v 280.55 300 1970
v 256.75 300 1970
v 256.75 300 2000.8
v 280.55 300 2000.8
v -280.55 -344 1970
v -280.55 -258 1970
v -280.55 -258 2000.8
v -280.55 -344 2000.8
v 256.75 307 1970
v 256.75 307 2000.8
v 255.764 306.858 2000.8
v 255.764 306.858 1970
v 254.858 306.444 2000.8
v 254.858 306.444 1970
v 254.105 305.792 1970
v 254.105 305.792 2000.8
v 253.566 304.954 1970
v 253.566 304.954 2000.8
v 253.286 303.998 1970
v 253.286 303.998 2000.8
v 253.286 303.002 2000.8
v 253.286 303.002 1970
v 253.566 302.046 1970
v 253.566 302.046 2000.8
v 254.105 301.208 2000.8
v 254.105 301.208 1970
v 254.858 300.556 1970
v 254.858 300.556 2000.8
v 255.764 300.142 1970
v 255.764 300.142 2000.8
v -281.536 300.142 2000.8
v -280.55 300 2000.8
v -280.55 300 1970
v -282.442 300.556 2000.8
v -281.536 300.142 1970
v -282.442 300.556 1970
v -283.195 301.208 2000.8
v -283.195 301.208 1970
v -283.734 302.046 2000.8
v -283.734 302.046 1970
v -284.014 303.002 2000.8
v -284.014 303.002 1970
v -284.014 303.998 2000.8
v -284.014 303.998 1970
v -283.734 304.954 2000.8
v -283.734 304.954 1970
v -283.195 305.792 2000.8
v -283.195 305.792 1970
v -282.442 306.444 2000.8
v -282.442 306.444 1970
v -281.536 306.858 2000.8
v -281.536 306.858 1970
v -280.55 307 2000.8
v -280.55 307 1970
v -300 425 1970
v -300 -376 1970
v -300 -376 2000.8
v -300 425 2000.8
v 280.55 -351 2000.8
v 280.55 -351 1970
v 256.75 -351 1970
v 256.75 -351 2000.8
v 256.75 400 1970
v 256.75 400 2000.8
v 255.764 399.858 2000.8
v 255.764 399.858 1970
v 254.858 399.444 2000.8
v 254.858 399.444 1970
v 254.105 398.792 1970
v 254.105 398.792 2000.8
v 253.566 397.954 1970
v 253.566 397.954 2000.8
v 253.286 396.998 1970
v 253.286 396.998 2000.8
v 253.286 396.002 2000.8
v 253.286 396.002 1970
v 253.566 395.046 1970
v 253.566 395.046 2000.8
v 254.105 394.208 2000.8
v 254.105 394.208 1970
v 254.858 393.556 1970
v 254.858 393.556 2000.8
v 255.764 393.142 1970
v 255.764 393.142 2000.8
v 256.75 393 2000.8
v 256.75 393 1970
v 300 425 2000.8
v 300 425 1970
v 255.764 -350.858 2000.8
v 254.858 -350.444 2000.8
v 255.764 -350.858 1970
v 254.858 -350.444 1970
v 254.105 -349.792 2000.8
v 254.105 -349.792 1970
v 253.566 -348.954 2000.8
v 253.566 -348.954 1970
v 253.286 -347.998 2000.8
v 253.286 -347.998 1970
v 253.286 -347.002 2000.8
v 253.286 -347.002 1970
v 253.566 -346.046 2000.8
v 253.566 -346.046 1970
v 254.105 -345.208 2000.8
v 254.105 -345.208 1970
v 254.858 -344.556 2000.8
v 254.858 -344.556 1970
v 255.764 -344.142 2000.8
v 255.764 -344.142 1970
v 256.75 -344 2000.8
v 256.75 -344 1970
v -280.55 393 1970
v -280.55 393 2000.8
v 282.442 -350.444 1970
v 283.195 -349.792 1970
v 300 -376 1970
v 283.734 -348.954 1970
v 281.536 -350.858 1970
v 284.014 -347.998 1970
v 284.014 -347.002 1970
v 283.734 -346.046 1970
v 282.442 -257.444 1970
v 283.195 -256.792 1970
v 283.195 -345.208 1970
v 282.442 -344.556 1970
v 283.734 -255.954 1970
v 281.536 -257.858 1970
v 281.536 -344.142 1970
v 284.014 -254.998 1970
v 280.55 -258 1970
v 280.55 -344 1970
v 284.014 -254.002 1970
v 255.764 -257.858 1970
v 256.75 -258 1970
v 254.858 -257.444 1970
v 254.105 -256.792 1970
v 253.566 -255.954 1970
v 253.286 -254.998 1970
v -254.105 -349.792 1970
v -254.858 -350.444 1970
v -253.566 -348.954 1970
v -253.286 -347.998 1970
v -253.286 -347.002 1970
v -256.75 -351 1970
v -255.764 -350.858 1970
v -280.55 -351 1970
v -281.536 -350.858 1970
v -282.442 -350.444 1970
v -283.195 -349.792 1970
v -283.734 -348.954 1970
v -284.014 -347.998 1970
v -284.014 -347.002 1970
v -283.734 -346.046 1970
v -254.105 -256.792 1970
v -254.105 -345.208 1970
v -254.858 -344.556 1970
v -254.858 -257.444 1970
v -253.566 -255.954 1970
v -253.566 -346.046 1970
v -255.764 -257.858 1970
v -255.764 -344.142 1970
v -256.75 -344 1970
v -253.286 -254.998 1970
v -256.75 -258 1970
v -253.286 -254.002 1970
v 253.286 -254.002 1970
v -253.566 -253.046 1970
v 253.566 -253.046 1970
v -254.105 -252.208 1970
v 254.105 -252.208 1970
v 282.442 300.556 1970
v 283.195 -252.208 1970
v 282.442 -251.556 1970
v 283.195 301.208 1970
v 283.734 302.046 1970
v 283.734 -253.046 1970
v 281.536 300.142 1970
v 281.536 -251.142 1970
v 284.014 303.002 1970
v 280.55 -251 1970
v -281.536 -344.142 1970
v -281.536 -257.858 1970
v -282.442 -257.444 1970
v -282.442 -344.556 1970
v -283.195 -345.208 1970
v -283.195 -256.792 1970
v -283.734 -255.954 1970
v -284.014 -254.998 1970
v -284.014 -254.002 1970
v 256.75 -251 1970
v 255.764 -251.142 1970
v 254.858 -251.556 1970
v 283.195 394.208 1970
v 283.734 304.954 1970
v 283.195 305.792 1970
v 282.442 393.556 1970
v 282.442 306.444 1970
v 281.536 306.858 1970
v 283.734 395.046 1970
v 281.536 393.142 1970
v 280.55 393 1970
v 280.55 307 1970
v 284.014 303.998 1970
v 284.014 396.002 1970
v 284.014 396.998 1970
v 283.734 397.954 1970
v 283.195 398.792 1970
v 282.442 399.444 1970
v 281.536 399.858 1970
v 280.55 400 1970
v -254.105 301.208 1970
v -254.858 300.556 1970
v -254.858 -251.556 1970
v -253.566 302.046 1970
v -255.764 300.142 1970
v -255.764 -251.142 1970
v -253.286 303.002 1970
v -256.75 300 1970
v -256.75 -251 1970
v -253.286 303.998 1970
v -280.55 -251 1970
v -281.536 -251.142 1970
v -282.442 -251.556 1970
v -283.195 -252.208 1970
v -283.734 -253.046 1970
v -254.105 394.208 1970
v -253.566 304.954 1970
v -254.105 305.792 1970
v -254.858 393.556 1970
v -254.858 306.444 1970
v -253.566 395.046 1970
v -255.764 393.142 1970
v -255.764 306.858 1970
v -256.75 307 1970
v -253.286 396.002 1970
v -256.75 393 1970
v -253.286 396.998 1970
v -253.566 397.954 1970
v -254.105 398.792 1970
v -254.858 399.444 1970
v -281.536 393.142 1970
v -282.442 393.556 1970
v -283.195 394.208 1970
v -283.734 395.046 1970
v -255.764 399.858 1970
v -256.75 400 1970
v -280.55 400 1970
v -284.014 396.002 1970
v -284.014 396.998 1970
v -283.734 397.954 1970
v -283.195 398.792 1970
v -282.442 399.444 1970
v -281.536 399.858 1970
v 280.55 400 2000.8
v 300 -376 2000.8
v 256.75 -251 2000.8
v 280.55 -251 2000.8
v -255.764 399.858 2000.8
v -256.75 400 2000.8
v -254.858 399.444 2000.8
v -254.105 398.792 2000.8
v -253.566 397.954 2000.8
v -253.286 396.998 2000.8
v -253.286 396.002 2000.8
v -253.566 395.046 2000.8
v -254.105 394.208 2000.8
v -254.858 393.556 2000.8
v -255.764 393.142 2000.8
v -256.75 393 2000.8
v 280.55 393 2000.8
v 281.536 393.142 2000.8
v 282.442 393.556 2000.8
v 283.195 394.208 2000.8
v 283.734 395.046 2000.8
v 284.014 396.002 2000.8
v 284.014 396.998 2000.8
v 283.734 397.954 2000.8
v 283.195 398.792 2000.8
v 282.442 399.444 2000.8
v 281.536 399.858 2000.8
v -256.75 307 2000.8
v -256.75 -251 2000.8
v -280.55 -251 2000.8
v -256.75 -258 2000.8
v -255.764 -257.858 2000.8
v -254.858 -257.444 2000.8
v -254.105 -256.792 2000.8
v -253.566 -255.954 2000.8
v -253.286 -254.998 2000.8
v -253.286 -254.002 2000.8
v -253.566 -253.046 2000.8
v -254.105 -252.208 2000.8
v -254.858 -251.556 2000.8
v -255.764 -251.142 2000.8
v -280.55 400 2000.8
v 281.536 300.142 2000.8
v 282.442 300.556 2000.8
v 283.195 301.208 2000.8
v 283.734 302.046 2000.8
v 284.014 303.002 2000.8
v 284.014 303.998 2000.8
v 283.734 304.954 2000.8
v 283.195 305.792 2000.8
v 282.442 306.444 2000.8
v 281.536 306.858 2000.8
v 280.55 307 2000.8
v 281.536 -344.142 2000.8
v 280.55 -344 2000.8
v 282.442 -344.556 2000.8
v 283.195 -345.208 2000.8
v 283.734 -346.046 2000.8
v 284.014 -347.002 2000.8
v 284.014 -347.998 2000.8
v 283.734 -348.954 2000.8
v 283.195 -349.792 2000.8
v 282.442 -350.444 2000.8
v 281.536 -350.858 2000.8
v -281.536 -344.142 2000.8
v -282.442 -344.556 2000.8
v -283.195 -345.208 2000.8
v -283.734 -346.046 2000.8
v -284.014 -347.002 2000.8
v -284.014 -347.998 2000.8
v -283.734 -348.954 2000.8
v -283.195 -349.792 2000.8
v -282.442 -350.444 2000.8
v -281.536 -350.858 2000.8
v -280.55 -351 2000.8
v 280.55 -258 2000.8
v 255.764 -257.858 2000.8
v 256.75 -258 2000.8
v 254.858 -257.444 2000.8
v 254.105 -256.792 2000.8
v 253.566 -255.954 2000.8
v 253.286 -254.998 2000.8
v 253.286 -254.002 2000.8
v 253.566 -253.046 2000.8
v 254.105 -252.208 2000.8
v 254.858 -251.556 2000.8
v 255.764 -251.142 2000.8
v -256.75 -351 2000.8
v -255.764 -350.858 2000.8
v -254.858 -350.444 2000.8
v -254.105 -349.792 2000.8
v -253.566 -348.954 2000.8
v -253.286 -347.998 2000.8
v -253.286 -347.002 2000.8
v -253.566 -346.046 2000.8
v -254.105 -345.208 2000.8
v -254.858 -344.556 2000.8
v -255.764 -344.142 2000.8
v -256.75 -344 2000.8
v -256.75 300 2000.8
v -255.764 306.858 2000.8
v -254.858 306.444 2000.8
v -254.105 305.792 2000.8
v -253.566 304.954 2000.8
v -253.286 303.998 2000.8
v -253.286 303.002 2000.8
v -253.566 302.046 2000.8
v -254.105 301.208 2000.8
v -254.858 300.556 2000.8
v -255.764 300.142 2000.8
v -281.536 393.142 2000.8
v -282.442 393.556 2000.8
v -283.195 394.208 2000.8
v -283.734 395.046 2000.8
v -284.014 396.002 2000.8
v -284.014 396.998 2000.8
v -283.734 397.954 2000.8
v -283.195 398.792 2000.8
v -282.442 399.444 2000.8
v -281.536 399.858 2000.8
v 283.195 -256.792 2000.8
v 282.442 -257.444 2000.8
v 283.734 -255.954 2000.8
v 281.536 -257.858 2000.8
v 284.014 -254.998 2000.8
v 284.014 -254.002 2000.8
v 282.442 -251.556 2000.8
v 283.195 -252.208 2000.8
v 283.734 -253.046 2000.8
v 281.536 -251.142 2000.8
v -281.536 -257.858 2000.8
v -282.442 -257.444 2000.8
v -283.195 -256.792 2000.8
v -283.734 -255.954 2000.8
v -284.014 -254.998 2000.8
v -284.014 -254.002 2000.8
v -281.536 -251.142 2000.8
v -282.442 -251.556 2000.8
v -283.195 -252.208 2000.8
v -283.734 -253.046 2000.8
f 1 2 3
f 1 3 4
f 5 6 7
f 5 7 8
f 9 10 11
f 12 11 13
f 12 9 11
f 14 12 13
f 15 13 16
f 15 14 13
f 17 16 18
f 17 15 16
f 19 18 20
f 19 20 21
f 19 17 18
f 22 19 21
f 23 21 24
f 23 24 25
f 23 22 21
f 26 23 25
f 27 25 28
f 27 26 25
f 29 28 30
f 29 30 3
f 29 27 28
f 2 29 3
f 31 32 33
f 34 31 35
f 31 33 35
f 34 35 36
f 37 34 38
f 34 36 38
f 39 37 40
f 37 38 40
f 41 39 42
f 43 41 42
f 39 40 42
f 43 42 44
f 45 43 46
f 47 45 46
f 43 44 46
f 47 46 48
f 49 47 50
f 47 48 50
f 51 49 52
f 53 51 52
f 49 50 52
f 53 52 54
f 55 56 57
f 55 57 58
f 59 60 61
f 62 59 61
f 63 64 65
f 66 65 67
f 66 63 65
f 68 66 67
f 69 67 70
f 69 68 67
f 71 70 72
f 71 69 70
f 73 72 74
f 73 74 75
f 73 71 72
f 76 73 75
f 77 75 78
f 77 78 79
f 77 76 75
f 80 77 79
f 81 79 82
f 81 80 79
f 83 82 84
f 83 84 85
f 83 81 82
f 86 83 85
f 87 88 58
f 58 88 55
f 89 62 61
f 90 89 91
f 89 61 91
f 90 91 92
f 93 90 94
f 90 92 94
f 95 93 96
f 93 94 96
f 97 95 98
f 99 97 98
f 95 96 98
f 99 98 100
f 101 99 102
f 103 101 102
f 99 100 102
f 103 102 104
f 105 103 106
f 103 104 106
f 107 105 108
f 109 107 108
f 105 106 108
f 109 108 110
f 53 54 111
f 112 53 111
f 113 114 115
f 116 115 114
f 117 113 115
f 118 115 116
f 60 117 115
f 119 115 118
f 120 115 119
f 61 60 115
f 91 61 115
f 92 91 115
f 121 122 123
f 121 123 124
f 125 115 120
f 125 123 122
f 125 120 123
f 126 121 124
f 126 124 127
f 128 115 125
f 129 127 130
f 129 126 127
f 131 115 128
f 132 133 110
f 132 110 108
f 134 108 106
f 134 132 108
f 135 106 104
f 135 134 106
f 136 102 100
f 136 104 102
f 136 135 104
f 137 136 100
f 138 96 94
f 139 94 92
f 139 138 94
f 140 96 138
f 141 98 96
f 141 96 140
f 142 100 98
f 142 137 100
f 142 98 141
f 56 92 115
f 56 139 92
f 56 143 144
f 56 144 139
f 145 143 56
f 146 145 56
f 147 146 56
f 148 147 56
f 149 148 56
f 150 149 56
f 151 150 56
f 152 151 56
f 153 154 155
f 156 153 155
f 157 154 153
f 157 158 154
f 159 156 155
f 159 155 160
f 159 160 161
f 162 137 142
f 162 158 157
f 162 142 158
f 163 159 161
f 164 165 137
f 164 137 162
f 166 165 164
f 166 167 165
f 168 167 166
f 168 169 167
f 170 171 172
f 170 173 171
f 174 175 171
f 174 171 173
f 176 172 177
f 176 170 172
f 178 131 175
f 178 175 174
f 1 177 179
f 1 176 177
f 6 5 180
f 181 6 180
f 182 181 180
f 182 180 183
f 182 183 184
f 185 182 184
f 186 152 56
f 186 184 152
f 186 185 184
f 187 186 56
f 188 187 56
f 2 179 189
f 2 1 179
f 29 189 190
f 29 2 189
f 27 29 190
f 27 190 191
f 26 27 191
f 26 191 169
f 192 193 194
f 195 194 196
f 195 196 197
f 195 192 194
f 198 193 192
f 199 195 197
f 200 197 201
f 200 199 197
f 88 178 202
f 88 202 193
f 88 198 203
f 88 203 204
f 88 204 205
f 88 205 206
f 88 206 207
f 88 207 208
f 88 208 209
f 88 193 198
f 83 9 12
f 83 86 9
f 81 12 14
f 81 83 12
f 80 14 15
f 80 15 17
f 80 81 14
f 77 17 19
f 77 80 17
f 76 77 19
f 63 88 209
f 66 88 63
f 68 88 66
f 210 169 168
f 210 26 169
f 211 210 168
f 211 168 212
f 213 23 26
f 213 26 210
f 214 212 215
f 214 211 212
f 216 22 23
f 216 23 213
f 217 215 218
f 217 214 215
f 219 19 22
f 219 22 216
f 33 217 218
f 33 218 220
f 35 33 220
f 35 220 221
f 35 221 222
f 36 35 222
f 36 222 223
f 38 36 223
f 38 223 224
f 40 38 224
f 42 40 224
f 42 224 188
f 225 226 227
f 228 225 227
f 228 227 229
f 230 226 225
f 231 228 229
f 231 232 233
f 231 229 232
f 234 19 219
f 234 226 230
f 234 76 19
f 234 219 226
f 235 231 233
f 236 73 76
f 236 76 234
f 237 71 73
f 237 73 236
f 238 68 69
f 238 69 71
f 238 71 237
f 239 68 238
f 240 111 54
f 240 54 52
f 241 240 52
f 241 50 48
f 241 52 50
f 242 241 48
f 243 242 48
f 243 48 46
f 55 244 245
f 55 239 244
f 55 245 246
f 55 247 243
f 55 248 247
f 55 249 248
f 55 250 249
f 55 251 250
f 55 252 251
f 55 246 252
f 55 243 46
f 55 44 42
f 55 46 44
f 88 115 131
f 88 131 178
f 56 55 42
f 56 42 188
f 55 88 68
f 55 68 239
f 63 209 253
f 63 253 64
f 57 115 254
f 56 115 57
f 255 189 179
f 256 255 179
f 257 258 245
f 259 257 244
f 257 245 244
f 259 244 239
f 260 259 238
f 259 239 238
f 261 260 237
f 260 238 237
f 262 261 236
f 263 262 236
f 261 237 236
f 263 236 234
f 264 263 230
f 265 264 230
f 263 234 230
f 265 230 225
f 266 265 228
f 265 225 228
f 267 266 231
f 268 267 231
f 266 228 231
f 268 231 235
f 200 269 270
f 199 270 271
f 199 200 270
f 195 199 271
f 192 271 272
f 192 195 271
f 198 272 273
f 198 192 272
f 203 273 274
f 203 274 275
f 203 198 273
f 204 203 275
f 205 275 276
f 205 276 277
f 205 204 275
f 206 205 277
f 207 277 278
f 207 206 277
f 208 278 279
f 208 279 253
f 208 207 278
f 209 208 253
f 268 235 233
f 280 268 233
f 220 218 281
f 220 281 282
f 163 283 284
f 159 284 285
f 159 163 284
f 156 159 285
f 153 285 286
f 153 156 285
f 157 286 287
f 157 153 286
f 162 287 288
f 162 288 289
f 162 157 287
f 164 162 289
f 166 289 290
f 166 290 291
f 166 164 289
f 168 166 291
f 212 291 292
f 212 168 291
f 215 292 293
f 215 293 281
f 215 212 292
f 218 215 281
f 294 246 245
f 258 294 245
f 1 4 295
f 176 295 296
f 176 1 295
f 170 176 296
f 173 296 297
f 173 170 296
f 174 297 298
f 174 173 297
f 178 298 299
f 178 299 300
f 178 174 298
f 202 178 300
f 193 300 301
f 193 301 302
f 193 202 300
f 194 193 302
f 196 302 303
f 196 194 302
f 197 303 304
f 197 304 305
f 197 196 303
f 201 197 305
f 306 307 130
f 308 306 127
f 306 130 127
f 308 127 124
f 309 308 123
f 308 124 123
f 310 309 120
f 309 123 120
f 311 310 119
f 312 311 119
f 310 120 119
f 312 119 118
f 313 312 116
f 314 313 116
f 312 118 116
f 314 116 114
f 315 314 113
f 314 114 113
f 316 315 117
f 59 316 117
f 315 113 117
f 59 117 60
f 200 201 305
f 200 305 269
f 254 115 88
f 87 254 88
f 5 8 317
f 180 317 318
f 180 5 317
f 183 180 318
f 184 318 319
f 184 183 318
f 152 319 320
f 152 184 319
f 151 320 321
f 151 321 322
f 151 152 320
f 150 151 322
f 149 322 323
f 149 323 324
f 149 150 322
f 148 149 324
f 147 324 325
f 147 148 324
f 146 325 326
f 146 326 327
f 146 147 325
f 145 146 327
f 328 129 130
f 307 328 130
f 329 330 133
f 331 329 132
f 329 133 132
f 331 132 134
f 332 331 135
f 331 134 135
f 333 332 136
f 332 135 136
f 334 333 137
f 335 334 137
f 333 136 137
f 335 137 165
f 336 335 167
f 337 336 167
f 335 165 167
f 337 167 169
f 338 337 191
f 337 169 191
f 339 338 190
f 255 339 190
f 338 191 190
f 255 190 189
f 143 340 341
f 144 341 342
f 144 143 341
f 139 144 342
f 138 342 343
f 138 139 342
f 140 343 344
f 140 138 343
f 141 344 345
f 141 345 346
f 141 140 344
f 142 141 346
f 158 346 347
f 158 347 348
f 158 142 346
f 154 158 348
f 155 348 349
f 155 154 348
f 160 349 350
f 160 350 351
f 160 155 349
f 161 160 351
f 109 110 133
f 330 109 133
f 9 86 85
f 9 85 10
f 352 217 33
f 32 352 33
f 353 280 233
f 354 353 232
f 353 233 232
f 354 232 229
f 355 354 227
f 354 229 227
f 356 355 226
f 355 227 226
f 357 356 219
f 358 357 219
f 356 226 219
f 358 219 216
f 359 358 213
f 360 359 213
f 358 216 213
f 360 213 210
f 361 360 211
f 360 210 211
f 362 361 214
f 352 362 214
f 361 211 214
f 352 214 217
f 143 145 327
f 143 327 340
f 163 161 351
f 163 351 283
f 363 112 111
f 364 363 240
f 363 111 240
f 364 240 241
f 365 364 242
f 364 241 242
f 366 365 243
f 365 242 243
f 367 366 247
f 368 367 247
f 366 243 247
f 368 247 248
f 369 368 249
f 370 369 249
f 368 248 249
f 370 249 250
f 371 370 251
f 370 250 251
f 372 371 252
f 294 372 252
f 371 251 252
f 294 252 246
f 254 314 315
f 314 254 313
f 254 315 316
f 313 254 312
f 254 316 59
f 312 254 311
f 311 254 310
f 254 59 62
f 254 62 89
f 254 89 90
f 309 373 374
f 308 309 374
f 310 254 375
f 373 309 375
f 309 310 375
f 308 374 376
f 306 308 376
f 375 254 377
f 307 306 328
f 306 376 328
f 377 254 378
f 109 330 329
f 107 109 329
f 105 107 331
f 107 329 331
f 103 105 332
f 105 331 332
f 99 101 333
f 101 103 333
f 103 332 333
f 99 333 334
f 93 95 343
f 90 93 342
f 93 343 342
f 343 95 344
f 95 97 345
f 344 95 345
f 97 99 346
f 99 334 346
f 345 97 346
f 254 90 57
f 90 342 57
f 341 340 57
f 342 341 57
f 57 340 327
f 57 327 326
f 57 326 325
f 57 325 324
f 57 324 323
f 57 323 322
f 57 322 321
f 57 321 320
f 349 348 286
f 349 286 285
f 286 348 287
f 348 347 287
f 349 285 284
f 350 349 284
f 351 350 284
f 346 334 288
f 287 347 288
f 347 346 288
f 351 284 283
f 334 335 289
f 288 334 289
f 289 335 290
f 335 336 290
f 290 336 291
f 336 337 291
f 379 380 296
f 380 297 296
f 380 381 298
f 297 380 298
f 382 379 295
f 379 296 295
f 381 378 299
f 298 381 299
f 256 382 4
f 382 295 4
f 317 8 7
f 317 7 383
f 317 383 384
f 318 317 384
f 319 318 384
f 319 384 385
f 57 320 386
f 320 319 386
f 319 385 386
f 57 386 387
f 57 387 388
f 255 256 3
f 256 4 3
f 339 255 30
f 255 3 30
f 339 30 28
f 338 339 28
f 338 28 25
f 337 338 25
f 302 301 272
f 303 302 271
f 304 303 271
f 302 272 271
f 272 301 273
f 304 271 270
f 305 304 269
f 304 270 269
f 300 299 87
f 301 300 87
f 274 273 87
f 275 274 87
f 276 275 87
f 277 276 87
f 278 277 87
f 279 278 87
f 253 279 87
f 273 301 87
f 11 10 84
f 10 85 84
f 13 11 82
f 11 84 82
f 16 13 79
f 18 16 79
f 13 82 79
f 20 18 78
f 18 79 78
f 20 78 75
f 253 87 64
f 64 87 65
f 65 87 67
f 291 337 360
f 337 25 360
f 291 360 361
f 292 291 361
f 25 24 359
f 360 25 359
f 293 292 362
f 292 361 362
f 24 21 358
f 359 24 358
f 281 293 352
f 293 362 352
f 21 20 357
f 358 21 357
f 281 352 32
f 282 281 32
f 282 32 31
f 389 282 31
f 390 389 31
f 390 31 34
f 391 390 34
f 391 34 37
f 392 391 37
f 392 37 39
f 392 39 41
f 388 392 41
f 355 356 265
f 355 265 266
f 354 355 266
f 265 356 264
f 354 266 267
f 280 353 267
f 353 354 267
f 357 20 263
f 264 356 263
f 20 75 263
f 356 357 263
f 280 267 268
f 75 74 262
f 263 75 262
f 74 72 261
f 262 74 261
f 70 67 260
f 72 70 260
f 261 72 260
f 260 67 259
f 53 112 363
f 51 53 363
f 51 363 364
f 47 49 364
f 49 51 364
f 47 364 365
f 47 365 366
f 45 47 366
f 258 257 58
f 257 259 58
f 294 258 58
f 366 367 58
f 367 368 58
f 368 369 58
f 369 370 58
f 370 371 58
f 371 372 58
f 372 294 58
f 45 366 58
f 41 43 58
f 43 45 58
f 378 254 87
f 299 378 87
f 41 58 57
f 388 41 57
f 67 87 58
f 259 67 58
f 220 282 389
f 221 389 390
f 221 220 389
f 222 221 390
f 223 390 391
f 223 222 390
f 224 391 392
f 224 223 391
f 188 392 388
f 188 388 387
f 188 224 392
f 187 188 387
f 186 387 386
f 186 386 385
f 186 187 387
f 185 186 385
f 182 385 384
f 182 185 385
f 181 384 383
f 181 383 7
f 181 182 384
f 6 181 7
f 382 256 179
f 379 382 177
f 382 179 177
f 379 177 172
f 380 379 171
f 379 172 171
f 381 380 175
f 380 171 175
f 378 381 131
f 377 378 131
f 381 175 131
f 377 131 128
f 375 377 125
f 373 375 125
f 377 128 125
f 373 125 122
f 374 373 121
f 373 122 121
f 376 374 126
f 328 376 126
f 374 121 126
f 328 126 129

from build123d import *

# Parameters (mm, degrees)
SKETCH1_W           = 600
SKETCH1_H           = 801
BOSS_EXTRUDE1_DEPTH = 30.8


with BuildPart() as part:
    # Sketch1 → Boss-Extrude1 (new body)
    with BuildSketch(Plane(origin=(0, 0, 1970), x_dir=(-1, 0, 0), z_dir=(0, 0, -1))):
        with Locations((0, 24.5)):
            Rectangle(SKETCH1_W, SKETCH1_H)
        with BuildLine():
            Line((256.75, 393), (256.75, 307))
            ThreePointArc((256.75, 307), (253.25, 303.5), (256.75, 300))
            Line((256.75, 300), (280.55, 300))
            ThreePointArc((280.55, 300), (284.05, 303.5), (280.55, 307))
            Line((280.55, 307), (280.55, 393))
            ThreePointArc((280.55, 393), (284.05, 396.5), (280.55, 400))
            Line((280.55, 400), (256.75, 400))
            ThreePointArc((256.75, 400), (253.25, 396.5), (256.75, 393))
        make_face(mode=Mode.SUBTRACT)
        with BuildLine():
            Line((-256.75, 300), (-280.55, 300))
            ThreePointArc((-280.55, 300), (-284.05, 303.5), (-280.55, 307))
            Line((-280.55, 307), (-280.55, 393))
            ThreePointArc((-280.55, 393), (-284.05, 396.5), (-280.55, 400))
            Line((-280.55, 400), (-256.75, 400))
            ThreePointArc((-256.75, 400), (-253.25, 396.5), (-256.75, 393))
            Line((-256.75, 393), (-256.75, 307))
            ThreePointArc((-256.75, 307), (-253.25, 303.5), (-256.75, 300))
        make_face(mode=Mode.SUBTRACT)
        with BuildLine():
            Line((-256.75, -344), (-256.75, -258))
            ThreePointArc((-256.75, -258), (-253.25, -254.5), (-256.75, -251))
            Line((-256.75, -251), (-280.55, -251))
            ThreePointArc((-280.55, -251), (-284.05, -254.5), (-280.55, -258))
            Line((-280.55, -258), (-280.55, -344))
            ThreePointArc((-280.55, -344), (-284.05, -347.5), (-280.55, -351))
            Line((-280.55, -351), (-256.75, -351))
            ThreePointArc((-256.75, -351), (-253.25, -347.5), (-256.75, -344))
        make_face(mode=Mode.SUBTRACT)
        with BuildLine():
            Line((256.75, -251), (280.55, -251))
            ThreePointArc((280.55, -251), (284.05, -254.5), (280.55, -258))
            Line((280.55, -258), (280.55, -344))
            ThreePointArc((280.55, -344), (284.05, -347.5), (280.55, -351))
            Line((280.55, -351), (256.75, -351))
            ThreePointArc((256.75, -351), (253.25, -347.5), (256.75, -344))
            Line((256.75, -344), (256.75, -258))
            ThreePointArc((256.75, -258), (253.25, -254.5), (256.75, -251))
        make_face(mode=Mode.SUBTRACT)
    extrude(amount=-BOSS_EXTRUDE1_DEPTH)


solid = part.part
